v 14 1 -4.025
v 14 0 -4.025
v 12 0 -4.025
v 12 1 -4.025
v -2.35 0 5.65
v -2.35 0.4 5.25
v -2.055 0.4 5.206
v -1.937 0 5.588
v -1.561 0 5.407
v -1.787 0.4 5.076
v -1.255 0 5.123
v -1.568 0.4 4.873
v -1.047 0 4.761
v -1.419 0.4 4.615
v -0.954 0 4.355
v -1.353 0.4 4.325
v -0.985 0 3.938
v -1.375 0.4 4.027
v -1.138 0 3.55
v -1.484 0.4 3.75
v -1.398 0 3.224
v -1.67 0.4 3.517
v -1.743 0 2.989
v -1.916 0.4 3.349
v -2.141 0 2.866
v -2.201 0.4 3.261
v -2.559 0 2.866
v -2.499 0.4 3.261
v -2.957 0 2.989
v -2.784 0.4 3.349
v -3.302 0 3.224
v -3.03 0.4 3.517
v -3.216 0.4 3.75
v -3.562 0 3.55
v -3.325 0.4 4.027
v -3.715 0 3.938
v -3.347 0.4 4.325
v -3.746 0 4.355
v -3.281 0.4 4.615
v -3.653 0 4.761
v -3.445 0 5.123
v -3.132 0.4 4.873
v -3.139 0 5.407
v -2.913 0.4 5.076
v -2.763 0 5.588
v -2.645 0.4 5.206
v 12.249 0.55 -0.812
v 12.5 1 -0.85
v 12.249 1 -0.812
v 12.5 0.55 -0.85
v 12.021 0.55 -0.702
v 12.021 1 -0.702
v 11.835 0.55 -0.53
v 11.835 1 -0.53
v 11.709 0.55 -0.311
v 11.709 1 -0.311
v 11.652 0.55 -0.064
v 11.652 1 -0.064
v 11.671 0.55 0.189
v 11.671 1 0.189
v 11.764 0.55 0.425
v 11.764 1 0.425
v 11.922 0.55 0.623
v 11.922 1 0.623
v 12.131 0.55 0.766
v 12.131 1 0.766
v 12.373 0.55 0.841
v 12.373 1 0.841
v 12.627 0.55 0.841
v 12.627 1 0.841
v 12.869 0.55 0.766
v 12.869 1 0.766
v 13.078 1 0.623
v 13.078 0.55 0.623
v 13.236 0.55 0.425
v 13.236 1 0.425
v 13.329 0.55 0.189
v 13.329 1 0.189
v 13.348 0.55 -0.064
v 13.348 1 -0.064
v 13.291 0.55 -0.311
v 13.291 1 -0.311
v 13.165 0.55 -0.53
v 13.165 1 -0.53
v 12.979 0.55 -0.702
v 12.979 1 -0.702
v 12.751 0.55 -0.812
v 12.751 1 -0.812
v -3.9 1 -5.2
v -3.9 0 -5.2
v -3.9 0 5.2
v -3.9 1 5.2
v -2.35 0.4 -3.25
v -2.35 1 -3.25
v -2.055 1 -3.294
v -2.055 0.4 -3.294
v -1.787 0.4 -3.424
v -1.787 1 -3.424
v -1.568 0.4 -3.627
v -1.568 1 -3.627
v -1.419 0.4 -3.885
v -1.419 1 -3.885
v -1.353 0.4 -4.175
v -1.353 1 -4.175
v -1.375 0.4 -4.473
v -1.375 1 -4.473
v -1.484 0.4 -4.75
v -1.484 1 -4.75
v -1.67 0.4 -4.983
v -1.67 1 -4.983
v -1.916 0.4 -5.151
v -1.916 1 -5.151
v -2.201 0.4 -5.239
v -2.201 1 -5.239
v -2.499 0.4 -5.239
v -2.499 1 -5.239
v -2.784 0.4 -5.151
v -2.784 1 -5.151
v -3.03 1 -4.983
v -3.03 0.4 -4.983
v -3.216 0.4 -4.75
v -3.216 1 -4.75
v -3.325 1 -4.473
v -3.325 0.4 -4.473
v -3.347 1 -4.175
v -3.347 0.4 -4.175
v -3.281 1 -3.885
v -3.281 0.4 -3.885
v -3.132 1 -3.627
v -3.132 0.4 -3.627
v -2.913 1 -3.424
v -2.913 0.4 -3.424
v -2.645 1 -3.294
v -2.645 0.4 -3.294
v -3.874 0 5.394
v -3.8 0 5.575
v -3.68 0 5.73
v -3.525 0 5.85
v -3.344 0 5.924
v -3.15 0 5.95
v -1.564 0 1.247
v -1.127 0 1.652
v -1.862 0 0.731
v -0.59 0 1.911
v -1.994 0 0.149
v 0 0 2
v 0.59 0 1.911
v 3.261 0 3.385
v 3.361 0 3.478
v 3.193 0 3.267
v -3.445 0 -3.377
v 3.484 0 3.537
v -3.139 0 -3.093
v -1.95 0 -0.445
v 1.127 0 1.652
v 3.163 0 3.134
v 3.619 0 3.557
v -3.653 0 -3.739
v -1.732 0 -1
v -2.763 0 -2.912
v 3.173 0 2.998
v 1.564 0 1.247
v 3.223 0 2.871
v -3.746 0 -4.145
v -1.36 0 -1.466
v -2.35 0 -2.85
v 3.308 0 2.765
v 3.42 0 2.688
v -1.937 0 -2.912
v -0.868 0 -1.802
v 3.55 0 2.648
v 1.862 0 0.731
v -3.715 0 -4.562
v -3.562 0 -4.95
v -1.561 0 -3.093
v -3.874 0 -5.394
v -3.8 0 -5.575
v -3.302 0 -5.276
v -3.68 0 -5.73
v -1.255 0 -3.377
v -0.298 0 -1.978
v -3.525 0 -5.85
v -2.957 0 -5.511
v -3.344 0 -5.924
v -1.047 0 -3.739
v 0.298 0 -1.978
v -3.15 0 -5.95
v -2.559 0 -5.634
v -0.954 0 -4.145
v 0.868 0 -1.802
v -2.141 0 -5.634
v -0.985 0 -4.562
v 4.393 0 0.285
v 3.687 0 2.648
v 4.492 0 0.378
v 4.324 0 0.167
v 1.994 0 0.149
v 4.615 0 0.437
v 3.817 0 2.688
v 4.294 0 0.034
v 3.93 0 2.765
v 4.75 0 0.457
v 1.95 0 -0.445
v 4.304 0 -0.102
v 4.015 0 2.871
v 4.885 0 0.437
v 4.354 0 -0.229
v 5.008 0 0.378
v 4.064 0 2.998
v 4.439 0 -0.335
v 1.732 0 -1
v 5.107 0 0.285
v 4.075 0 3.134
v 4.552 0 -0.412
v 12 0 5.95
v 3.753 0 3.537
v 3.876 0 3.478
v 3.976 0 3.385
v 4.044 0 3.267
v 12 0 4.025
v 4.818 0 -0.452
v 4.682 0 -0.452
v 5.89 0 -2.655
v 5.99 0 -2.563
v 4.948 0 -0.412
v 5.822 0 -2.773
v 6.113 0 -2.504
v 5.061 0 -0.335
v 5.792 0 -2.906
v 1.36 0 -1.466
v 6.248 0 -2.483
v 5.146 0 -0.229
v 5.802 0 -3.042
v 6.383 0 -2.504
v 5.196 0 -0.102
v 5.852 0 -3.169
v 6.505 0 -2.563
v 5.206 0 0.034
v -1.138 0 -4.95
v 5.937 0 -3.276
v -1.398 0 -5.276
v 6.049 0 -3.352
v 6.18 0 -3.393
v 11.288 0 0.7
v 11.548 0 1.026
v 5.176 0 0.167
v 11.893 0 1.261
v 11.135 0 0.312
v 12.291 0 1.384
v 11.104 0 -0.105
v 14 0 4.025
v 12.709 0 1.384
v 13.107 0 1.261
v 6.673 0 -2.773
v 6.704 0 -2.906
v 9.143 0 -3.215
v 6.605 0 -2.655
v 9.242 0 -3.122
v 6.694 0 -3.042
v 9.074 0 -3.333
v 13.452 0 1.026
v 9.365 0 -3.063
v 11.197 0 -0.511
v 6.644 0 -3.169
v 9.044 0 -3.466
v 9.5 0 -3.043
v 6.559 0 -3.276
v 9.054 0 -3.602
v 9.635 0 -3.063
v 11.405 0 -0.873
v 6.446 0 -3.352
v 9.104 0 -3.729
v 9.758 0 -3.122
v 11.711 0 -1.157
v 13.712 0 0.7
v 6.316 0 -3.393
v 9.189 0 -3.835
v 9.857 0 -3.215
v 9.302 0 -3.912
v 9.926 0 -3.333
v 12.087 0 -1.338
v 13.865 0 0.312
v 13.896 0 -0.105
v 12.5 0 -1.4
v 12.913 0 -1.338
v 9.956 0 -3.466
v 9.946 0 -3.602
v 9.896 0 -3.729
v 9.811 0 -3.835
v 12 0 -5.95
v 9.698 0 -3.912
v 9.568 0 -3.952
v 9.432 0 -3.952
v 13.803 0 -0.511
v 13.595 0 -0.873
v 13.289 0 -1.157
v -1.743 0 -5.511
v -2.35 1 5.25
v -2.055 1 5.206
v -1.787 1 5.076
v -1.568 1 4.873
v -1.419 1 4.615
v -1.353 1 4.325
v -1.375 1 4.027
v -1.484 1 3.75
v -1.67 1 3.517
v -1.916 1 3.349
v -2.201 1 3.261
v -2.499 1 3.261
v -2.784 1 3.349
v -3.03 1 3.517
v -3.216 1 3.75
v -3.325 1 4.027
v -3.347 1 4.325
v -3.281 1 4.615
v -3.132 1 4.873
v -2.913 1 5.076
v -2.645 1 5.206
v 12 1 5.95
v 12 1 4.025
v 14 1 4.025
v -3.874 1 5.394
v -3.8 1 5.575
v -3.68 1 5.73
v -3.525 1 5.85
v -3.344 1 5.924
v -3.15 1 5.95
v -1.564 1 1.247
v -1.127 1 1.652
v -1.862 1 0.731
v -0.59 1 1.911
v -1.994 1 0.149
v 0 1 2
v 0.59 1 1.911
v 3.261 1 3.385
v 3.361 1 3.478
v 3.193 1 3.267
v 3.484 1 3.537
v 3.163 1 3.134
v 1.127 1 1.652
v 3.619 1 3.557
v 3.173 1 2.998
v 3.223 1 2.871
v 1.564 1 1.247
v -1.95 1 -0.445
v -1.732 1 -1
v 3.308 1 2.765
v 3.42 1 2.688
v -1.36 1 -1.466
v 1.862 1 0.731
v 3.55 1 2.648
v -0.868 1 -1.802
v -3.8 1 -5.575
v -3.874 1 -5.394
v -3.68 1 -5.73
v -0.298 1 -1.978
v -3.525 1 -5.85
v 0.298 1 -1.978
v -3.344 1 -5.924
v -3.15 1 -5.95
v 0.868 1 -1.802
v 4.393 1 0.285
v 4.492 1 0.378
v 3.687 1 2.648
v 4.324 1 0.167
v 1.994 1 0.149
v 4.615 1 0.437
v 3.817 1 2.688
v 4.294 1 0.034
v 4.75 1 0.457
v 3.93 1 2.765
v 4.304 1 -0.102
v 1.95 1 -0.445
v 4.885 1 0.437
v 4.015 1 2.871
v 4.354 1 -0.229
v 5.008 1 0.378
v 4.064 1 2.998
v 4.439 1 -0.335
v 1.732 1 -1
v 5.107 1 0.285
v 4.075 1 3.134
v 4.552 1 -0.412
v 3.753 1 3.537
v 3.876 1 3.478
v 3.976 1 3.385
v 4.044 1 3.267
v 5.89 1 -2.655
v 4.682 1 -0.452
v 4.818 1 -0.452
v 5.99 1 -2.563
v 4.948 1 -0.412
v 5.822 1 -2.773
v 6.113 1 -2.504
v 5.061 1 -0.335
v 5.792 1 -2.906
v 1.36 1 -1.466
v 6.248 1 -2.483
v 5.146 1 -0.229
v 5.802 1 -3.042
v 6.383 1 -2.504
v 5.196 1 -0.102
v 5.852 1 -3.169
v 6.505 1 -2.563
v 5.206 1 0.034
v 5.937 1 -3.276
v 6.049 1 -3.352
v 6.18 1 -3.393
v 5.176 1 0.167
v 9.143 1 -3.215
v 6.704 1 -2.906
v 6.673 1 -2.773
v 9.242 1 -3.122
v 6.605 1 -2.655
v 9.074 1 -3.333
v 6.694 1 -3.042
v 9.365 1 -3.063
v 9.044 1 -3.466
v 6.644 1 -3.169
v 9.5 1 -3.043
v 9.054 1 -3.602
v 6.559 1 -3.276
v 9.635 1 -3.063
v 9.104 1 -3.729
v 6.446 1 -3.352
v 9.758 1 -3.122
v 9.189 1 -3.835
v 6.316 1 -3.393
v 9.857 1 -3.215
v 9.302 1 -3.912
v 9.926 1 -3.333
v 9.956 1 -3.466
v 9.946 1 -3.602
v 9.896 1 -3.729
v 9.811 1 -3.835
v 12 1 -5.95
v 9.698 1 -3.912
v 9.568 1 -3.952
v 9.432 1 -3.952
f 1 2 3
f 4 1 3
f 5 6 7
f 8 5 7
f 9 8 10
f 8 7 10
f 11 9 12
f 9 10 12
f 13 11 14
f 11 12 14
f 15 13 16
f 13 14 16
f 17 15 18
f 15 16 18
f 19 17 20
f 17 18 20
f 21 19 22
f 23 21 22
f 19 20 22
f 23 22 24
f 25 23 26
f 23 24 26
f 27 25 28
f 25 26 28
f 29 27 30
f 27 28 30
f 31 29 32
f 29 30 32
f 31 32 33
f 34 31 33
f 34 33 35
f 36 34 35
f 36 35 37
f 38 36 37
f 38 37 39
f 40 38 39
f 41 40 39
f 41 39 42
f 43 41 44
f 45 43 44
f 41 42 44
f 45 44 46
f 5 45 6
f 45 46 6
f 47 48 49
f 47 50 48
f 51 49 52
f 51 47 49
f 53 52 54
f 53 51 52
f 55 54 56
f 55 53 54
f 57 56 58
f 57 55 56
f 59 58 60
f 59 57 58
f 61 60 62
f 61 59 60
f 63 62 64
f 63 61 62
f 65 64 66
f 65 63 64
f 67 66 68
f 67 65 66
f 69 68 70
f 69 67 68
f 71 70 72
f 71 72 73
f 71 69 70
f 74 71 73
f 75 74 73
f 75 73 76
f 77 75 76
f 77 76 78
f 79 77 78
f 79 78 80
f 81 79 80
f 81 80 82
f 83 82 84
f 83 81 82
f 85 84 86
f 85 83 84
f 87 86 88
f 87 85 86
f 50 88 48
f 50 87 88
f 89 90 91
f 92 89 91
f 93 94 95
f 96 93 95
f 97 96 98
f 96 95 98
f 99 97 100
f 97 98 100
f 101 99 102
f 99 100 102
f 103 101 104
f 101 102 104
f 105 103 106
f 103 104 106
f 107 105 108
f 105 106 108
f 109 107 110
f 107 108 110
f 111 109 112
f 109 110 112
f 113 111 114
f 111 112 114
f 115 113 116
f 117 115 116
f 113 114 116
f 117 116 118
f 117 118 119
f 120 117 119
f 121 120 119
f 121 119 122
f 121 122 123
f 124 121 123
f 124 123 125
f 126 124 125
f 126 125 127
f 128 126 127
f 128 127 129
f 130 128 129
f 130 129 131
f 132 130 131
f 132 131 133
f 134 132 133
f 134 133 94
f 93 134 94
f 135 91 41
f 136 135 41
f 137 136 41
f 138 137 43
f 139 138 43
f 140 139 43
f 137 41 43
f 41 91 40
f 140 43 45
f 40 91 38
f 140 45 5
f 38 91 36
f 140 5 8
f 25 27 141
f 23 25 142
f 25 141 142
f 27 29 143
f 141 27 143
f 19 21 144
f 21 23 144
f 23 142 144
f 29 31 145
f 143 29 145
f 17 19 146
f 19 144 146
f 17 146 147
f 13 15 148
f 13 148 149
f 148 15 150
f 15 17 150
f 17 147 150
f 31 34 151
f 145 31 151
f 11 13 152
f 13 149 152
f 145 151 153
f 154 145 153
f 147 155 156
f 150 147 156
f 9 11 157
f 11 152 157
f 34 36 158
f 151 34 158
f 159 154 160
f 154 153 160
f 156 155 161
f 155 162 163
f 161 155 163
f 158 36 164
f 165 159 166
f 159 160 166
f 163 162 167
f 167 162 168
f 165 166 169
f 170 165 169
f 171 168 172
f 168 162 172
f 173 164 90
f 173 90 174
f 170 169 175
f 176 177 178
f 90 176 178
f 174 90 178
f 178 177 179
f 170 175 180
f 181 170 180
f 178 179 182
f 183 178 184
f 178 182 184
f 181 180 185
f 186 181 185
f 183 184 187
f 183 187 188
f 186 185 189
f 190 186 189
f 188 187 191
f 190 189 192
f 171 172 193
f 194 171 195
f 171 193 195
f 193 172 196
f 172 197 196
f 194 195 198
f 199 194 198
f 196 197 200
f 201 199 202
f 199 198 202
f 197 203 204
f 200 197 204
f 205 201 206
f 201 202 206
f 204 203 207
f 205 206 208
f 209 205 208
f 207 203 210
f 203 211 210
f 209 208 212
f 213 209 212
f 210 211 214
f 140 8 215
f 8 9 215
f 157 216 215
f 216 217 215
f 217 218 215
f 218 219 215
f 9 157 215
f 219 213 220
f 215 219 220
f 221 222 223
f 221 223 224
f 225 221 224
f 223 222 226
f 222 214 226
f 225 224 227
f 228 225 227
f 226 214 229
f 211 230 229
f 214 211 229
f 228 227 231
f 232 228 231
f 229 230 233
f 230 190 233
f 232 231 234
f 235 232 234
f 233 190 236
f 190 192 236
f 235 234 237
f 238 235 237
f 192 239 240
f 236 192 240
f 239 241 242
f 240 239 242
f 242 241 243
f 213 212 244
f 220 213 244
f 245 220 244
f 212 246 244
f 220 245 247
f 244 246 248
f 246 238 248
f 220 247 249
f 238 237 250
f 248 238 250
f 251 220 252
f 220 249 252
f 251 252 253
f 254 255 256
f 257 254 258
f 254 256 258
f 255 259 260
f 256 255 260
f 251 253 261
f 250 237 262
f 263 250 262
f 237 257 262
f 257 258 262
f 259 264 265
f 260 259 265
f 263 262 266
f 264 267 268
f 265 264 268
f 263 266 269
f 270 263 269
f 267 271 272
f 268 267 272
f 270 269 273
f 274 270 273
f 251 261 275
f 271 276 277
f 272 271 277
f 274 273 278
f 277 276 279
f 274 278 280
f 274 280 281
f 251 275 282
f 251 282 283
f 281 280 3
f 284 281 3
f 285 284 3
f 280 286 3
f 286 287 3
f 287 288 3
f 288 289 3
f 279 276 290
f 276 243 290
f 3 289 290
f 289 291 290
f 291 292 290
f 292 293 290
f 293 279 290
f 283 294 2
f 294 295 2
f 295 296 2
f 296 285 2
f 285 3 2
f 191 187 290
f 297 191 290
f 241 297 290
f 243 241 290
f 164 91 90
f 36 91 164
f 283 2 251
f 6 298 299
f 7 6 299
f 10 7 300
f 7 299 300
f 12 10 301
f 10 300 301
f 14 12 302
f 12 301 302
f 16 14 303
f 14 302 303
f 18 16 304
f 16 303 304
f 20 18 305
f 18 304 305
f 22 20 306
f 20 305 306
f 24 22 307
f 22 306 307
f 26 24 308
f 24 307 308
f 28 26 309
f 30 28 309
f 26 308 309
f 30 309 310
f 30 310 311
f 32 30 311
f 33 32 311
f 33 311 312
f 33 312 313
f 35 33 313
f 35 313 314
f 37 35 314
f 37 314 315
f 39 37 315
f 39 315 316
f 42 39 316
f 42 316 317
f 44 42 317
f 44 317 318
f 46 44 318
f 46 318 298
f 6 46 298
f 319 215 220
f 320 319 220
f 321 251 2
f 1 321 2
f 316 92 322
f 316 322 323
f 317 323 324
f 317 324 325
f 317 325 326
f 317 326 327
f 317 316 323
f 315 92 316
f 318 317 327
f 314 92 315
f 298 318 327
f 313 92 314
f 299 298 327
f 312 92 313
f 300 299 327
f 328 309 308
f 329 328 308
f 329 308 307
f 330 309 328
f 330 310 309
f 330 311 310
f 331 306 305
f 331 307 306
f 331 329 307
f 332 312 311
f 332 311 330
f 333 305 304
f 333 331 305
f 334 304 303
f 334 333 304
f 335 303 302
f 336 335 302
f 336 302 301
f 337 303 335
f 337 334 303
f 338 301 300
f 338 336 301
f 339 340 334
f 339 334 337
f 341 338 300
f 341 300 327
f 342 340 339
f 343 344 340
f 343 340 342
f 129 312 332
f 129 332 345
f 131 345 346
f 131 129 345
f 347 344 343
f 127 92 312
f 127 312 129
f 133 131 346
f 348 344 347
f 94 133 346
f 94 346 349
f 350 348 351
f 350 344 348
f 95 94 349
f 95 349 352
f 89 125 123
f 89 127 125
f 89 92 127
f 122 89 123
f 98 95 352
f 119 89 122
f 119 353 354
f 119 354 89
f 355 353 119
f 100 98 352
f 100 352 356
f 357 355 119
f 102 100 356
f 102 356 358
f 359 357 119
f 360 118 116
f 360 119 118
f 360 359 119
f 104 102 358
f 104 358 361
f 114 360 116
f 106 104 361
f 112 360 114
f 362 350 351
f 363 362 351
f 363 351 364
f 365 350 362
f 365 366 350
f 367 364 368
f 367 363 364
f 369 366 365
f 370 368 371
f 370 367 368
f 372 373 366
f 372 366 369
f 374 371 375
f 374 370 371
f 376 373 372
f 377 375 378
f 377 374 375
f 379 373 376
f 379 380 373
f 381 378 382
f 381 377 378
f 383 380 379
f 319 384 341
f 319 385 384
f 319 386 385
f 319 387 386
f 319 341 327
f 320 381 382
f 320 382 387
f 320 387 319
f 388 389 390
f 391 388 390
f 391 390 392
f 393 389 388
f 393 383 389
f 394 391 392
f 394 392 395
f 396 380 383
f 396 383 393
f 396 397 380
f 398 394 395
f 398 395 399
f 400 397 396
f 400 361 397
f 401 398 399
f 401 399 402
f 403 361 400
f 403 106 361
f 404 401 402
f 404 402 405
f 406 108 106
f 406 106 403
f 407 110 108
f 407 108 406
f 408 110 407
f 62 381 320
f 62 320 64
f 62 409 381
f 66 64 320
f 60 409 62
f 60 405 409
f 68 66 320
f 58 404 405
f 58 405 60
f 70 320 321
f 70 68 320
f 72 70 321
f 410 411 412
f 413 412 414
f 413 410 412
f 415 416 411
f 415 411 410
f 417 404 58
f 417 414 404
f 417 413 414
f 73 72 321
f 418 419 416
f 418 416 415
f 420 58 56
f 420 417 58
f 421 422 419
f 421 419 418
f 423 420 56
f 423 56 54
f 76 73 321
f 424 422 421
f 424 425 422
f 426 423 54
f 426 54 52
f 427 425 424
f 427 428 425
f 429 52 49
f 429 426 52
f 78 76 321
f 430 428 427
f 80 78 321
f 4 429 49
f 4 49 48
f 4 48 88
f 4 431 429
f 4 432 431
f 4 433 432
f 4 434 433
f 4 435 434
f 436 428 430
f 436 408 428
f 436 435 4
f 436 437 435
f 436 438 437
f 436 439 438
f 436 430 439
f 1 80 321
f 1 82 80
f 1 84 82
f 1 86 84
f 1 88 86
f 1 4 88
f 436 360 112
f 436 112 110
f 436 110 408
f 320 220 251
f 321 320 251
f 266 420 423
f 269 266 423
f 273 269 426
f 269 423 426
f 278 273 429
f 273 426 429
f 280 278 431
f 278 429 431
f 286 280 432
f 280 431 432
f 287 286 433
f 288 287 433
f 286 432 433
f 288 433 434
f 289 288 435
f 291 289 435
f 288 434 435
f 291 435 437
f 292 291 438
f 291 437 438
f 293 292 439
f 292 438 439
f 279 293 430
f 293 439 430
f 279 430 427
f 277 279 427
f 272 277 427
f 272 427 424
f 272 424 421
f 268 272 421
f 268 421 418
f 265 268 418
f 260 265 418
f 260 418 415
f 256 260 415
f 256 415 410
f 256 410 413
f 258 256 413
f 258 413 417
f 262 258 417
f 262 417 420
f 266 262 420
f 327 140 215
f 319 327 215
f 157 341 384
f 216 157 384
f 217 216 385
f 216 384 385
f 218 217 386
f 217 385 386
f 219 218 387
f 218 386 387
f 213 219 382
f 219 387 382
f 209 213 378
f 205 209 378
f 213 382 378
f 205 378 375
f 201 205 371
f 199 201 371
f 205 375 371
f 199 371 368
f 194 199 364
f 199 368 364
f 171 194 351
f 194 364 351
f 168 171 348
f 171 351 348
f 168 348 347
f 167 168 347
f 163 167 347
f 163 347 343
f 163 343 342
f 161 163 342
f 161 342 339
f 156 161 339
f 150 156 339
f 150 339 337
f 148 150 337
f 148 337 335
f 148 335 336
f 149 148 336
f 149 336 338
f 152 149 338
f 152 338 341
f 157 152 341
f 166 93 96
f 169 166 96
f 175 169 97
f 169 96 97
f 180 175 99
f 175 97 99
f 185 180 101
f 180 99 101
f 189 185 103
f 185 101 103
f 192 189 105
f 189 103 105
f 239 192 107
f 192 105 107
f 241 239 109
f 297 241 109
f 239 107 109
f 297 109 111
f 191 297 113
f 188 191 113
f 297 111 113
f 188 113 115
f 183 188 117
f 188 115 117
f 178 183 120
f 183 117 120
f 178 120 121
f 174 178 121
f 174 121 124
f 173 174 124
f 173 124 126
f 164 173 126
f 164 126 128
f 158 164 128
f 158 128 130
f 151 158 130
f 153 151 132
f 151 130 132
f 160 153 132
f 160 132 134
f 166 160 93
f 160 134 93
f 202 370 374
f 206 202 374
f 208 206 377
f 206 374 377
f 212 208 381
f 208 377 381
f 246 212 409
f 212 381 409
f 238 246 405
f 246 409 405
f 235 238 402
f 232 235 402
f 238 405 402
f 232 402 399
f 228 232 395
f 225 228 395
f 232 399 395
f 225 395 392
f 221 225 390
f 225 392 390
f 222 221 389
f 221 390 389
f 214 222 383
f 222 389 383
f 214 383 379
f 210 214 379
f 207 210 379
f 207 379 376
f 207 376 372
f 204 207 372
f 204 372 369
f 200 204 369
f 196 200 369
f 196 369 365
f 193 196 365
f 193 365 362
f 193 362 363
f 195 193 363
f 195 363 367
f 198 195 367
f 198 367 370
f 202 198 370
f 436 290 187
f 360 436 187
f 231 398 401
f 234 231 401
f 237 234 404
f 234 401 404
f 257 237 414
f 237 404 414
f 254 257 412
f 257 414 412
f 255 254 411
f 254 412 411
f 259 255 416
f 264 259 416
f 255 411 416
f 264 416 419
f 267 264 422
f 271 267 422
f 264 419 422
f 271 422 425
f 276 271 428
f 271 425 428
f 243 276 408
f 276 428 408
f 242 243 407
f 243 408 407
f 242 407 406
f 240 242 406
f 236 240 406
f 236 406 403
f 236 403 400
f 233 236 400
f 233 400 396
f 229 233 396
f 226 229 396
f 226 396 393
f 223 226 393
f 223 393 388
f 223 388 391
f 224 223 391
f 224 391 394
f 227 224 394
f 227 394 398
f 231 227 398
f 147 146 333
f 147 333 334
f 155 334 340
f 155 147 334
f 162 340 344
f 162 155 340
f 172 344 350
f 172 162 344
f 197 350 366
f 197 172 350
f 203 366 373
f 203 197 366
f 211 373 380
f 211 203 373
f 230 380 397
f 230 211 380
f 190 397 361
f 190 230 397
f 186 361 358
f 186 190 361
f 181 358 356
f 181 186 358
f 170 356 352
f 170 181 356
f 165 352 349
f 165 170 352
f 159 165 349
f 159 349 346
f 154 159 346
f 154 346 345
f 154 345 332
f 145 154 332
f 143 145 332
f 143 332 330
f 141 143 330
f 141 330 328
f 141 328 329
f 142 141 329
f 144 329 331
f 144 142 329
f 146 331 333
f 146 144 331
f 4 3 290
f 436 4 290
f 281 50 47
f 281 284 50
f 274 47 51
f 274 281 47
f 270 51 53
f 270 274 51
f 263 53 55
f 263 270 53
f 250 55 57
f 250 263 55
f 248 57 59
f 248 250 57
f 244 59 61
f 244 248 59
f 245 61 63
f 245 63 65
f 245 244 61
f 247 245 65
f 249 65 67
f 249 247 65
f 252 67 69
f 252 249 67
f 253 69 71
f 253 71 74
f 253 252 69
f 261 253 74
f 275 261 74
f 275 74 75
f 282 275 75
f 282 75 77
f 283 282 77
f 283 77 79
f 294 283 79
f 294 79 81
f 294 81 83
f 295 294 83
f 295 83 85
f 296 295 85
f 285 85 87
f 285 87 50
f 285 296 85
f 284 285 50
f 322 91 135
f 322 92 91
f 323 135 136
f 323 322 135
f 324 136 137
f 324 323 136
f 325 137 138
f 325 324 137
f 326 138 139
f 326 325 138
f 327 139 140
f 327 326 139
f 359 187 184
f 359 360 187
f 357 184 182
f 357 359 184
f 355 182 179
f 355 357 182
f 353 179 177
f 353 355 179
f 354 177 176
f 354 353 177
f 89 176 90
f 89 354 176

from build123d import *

# Parameters (mm, degrees)
SKETCH1_R           = 2
BOSS_EXTRUDE1_DEPTH = 1
SKETCH2_R           = 1
CUT_EXTRUDE1_DEPTH  = 16.244753196
FILLET1_R           = 0.75
CHAMFER1_SIZE       = 0.4
SKETCH3_R           = 0.4572
CUT_EXTRUDE2_DEPTH  = 16.244753196


with BuildPart() as part:
    # Sketch1 → Boss-Extrude1 (new body)
    with BuildSketch(Plane(origin=(0, 0, 0), x_dir=(1, 0, 0), z_dir=(0, 1, 0))):
        Polygon((12, 5.95), (-3.9, 5.95), (-3.9, -5.95), (12, -5.95), (12, -4.025), (14, -4.025), (14, 4.025), (12, 4.025), align=None)
        with Locations(Location((0, 0, 0), (0, 0, 270))):
            Circle(SKETCH1_R, mode=Mode.SUBTRACT)
    extrude(amount=BOSS_EXTRUDE1_DEPTH)

    # Sketch2 → Cut-Extrude1 (cut, through all)
    with BuildSketch(Plane(origin=(0, 1, 0), x_dir=(1, 0, 0), z_dir=(0, 1, 0))):
        with Locations(Location((-2.35, 4.25, 0), (0, 0, 270))):
            Circle(SKETCH2_R)
        with Locations(Location((-2.35, -4.25, 0), (0, 0, 270))):
            Circle(SKETCH2_R)
    extrude(amount=-CUT_EXTRUDE1_DEPTH, mode=Mode.SUBTRACT)

    # Fillet1
    fillet1_edges = [part.edges().sort_by_distance(p)[0] for p in [
        (-3.9, 0.5, -5.95),
        (-3.9, 0.5, 5.95),
    ]]
    fillet(fillet1_edges, radius=FILLET1_R)

    # Chamfer1
    chamfer1_edges = [part.edges().sort_by_distance(p)[0] for p in [
        (-2.35, 0, -5.25),
        (-2.35, 0, 3.25),
    ]]
    chamfer(chamfer1_edges, length=CHAMFER1_SIZE)

    # Sketch3 → Cut-Extrude2 (cut, through all)
    with BuildSketch(Plane(origin=(0, 1, 0), x_dir=(1, 0, 0), z_dir=(0, 1, 0))):
        with Locations(Location((3.61862915, -3.1, 0), (0, 0, 270))):
            Circle(SKETCH3_R)
        with Locations(Location((4.75, 0, 0), (0, 0, 270))):
            Circle(SKETCH3_R)
        with Locations(Location((6.247772136, 2.94052353, 0), (0, 0, 270))):
            Circle(SKETCH3_R)
        with Locations(Location((9.5, 3.5, 0), (0, 0, 270))):
            Circle(SKETCH3_R)
    extrude(amount=-CUT_EXTRUDE2_DEPTH, mode=Mode.SUBTRACT)

    # Sketch5 → CSK for M1.6 Countersunk Raised Head Screw2 (revolve, cut)
    with BuildSketch(Plane(origin=(12.5, 0, 0), x_dir=(0, 0, -1), z_dir=(1, 0, 0))):
        Polygon((0, 0), (0, 1), (0.85, 1), (0.85, 0.55), (1.4, 0), align=None)
    revolve(axis=Axis((12.5, -6.35, 0), (0, 1, 0)), mode=Mode.SUBTRACT)


solid = part.part
